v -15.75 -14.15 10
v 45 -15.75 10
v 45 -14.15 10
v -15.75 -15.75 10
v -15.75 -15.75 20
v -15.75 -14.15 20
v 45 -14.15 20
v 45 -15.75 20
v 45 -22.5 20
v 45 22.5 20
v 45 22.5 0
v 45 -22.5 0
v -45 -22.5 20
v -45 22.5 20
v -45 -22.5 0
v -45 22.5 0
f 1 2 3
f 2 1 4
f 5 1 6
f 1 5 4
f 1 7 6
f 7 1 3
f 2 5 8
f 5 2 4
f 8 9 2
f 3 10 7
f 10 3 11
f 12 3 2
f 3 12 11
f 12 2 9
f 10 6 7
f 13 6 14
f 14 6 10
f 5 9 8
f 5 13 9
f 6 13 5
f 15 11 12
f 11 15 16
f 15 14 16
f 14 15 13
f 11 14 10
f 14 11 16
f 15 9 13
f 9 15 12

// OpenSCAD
// Slide drying rack for 10 microscope slides (75 x 25 x 1 mm)
// Print orientation: base on XY plane, slots open upward (+Z)

// ---- Block ----
block_len   = 90;    // block length along X (mm)
block_wid   = 45;    // block width along Y (mm)
block_ht    = 20;    // block height along Z (mm)

// ---- Slots ----
slot_count  = 10;    // number of slide slots
slot_len    = 77;    // slot length along X (mm)
slot_wid    = 1.6;   // slot width along Y (mm)
slot_depth  = 10;    // slot depth from top face (mm)
slot_pitch  = 3.5;   // centre-to-centre spacing in Y (mm)

// ---- Misc ----
eps         = 0.5;   // overshoot for clean cuts (mm)
$fn         = 64;    // curve resolution

// Slot group centre offsets
slot_x0 = -(slot_count - 1) * slot_pitch / 2;  // first slot X (group centred)
slot_y0 = -(slot_count - 1) * slot_pitch / 2;  // first slot Y (group centred)

difference() {
    // Base block
    translate([-block_len / 2, -block_wid / 2, 0])
        cube([block_len, block_wid, block_ht]);

    // Slots, open at the top
    for (i = [0 : slot_count - 1]) {
        translate([slot_x0 + i * slot_pitch, slot_y0, block_ht - slot_depth])
            cube([slot_len, slot_wid, slot_depth + eps]);
    }
}
